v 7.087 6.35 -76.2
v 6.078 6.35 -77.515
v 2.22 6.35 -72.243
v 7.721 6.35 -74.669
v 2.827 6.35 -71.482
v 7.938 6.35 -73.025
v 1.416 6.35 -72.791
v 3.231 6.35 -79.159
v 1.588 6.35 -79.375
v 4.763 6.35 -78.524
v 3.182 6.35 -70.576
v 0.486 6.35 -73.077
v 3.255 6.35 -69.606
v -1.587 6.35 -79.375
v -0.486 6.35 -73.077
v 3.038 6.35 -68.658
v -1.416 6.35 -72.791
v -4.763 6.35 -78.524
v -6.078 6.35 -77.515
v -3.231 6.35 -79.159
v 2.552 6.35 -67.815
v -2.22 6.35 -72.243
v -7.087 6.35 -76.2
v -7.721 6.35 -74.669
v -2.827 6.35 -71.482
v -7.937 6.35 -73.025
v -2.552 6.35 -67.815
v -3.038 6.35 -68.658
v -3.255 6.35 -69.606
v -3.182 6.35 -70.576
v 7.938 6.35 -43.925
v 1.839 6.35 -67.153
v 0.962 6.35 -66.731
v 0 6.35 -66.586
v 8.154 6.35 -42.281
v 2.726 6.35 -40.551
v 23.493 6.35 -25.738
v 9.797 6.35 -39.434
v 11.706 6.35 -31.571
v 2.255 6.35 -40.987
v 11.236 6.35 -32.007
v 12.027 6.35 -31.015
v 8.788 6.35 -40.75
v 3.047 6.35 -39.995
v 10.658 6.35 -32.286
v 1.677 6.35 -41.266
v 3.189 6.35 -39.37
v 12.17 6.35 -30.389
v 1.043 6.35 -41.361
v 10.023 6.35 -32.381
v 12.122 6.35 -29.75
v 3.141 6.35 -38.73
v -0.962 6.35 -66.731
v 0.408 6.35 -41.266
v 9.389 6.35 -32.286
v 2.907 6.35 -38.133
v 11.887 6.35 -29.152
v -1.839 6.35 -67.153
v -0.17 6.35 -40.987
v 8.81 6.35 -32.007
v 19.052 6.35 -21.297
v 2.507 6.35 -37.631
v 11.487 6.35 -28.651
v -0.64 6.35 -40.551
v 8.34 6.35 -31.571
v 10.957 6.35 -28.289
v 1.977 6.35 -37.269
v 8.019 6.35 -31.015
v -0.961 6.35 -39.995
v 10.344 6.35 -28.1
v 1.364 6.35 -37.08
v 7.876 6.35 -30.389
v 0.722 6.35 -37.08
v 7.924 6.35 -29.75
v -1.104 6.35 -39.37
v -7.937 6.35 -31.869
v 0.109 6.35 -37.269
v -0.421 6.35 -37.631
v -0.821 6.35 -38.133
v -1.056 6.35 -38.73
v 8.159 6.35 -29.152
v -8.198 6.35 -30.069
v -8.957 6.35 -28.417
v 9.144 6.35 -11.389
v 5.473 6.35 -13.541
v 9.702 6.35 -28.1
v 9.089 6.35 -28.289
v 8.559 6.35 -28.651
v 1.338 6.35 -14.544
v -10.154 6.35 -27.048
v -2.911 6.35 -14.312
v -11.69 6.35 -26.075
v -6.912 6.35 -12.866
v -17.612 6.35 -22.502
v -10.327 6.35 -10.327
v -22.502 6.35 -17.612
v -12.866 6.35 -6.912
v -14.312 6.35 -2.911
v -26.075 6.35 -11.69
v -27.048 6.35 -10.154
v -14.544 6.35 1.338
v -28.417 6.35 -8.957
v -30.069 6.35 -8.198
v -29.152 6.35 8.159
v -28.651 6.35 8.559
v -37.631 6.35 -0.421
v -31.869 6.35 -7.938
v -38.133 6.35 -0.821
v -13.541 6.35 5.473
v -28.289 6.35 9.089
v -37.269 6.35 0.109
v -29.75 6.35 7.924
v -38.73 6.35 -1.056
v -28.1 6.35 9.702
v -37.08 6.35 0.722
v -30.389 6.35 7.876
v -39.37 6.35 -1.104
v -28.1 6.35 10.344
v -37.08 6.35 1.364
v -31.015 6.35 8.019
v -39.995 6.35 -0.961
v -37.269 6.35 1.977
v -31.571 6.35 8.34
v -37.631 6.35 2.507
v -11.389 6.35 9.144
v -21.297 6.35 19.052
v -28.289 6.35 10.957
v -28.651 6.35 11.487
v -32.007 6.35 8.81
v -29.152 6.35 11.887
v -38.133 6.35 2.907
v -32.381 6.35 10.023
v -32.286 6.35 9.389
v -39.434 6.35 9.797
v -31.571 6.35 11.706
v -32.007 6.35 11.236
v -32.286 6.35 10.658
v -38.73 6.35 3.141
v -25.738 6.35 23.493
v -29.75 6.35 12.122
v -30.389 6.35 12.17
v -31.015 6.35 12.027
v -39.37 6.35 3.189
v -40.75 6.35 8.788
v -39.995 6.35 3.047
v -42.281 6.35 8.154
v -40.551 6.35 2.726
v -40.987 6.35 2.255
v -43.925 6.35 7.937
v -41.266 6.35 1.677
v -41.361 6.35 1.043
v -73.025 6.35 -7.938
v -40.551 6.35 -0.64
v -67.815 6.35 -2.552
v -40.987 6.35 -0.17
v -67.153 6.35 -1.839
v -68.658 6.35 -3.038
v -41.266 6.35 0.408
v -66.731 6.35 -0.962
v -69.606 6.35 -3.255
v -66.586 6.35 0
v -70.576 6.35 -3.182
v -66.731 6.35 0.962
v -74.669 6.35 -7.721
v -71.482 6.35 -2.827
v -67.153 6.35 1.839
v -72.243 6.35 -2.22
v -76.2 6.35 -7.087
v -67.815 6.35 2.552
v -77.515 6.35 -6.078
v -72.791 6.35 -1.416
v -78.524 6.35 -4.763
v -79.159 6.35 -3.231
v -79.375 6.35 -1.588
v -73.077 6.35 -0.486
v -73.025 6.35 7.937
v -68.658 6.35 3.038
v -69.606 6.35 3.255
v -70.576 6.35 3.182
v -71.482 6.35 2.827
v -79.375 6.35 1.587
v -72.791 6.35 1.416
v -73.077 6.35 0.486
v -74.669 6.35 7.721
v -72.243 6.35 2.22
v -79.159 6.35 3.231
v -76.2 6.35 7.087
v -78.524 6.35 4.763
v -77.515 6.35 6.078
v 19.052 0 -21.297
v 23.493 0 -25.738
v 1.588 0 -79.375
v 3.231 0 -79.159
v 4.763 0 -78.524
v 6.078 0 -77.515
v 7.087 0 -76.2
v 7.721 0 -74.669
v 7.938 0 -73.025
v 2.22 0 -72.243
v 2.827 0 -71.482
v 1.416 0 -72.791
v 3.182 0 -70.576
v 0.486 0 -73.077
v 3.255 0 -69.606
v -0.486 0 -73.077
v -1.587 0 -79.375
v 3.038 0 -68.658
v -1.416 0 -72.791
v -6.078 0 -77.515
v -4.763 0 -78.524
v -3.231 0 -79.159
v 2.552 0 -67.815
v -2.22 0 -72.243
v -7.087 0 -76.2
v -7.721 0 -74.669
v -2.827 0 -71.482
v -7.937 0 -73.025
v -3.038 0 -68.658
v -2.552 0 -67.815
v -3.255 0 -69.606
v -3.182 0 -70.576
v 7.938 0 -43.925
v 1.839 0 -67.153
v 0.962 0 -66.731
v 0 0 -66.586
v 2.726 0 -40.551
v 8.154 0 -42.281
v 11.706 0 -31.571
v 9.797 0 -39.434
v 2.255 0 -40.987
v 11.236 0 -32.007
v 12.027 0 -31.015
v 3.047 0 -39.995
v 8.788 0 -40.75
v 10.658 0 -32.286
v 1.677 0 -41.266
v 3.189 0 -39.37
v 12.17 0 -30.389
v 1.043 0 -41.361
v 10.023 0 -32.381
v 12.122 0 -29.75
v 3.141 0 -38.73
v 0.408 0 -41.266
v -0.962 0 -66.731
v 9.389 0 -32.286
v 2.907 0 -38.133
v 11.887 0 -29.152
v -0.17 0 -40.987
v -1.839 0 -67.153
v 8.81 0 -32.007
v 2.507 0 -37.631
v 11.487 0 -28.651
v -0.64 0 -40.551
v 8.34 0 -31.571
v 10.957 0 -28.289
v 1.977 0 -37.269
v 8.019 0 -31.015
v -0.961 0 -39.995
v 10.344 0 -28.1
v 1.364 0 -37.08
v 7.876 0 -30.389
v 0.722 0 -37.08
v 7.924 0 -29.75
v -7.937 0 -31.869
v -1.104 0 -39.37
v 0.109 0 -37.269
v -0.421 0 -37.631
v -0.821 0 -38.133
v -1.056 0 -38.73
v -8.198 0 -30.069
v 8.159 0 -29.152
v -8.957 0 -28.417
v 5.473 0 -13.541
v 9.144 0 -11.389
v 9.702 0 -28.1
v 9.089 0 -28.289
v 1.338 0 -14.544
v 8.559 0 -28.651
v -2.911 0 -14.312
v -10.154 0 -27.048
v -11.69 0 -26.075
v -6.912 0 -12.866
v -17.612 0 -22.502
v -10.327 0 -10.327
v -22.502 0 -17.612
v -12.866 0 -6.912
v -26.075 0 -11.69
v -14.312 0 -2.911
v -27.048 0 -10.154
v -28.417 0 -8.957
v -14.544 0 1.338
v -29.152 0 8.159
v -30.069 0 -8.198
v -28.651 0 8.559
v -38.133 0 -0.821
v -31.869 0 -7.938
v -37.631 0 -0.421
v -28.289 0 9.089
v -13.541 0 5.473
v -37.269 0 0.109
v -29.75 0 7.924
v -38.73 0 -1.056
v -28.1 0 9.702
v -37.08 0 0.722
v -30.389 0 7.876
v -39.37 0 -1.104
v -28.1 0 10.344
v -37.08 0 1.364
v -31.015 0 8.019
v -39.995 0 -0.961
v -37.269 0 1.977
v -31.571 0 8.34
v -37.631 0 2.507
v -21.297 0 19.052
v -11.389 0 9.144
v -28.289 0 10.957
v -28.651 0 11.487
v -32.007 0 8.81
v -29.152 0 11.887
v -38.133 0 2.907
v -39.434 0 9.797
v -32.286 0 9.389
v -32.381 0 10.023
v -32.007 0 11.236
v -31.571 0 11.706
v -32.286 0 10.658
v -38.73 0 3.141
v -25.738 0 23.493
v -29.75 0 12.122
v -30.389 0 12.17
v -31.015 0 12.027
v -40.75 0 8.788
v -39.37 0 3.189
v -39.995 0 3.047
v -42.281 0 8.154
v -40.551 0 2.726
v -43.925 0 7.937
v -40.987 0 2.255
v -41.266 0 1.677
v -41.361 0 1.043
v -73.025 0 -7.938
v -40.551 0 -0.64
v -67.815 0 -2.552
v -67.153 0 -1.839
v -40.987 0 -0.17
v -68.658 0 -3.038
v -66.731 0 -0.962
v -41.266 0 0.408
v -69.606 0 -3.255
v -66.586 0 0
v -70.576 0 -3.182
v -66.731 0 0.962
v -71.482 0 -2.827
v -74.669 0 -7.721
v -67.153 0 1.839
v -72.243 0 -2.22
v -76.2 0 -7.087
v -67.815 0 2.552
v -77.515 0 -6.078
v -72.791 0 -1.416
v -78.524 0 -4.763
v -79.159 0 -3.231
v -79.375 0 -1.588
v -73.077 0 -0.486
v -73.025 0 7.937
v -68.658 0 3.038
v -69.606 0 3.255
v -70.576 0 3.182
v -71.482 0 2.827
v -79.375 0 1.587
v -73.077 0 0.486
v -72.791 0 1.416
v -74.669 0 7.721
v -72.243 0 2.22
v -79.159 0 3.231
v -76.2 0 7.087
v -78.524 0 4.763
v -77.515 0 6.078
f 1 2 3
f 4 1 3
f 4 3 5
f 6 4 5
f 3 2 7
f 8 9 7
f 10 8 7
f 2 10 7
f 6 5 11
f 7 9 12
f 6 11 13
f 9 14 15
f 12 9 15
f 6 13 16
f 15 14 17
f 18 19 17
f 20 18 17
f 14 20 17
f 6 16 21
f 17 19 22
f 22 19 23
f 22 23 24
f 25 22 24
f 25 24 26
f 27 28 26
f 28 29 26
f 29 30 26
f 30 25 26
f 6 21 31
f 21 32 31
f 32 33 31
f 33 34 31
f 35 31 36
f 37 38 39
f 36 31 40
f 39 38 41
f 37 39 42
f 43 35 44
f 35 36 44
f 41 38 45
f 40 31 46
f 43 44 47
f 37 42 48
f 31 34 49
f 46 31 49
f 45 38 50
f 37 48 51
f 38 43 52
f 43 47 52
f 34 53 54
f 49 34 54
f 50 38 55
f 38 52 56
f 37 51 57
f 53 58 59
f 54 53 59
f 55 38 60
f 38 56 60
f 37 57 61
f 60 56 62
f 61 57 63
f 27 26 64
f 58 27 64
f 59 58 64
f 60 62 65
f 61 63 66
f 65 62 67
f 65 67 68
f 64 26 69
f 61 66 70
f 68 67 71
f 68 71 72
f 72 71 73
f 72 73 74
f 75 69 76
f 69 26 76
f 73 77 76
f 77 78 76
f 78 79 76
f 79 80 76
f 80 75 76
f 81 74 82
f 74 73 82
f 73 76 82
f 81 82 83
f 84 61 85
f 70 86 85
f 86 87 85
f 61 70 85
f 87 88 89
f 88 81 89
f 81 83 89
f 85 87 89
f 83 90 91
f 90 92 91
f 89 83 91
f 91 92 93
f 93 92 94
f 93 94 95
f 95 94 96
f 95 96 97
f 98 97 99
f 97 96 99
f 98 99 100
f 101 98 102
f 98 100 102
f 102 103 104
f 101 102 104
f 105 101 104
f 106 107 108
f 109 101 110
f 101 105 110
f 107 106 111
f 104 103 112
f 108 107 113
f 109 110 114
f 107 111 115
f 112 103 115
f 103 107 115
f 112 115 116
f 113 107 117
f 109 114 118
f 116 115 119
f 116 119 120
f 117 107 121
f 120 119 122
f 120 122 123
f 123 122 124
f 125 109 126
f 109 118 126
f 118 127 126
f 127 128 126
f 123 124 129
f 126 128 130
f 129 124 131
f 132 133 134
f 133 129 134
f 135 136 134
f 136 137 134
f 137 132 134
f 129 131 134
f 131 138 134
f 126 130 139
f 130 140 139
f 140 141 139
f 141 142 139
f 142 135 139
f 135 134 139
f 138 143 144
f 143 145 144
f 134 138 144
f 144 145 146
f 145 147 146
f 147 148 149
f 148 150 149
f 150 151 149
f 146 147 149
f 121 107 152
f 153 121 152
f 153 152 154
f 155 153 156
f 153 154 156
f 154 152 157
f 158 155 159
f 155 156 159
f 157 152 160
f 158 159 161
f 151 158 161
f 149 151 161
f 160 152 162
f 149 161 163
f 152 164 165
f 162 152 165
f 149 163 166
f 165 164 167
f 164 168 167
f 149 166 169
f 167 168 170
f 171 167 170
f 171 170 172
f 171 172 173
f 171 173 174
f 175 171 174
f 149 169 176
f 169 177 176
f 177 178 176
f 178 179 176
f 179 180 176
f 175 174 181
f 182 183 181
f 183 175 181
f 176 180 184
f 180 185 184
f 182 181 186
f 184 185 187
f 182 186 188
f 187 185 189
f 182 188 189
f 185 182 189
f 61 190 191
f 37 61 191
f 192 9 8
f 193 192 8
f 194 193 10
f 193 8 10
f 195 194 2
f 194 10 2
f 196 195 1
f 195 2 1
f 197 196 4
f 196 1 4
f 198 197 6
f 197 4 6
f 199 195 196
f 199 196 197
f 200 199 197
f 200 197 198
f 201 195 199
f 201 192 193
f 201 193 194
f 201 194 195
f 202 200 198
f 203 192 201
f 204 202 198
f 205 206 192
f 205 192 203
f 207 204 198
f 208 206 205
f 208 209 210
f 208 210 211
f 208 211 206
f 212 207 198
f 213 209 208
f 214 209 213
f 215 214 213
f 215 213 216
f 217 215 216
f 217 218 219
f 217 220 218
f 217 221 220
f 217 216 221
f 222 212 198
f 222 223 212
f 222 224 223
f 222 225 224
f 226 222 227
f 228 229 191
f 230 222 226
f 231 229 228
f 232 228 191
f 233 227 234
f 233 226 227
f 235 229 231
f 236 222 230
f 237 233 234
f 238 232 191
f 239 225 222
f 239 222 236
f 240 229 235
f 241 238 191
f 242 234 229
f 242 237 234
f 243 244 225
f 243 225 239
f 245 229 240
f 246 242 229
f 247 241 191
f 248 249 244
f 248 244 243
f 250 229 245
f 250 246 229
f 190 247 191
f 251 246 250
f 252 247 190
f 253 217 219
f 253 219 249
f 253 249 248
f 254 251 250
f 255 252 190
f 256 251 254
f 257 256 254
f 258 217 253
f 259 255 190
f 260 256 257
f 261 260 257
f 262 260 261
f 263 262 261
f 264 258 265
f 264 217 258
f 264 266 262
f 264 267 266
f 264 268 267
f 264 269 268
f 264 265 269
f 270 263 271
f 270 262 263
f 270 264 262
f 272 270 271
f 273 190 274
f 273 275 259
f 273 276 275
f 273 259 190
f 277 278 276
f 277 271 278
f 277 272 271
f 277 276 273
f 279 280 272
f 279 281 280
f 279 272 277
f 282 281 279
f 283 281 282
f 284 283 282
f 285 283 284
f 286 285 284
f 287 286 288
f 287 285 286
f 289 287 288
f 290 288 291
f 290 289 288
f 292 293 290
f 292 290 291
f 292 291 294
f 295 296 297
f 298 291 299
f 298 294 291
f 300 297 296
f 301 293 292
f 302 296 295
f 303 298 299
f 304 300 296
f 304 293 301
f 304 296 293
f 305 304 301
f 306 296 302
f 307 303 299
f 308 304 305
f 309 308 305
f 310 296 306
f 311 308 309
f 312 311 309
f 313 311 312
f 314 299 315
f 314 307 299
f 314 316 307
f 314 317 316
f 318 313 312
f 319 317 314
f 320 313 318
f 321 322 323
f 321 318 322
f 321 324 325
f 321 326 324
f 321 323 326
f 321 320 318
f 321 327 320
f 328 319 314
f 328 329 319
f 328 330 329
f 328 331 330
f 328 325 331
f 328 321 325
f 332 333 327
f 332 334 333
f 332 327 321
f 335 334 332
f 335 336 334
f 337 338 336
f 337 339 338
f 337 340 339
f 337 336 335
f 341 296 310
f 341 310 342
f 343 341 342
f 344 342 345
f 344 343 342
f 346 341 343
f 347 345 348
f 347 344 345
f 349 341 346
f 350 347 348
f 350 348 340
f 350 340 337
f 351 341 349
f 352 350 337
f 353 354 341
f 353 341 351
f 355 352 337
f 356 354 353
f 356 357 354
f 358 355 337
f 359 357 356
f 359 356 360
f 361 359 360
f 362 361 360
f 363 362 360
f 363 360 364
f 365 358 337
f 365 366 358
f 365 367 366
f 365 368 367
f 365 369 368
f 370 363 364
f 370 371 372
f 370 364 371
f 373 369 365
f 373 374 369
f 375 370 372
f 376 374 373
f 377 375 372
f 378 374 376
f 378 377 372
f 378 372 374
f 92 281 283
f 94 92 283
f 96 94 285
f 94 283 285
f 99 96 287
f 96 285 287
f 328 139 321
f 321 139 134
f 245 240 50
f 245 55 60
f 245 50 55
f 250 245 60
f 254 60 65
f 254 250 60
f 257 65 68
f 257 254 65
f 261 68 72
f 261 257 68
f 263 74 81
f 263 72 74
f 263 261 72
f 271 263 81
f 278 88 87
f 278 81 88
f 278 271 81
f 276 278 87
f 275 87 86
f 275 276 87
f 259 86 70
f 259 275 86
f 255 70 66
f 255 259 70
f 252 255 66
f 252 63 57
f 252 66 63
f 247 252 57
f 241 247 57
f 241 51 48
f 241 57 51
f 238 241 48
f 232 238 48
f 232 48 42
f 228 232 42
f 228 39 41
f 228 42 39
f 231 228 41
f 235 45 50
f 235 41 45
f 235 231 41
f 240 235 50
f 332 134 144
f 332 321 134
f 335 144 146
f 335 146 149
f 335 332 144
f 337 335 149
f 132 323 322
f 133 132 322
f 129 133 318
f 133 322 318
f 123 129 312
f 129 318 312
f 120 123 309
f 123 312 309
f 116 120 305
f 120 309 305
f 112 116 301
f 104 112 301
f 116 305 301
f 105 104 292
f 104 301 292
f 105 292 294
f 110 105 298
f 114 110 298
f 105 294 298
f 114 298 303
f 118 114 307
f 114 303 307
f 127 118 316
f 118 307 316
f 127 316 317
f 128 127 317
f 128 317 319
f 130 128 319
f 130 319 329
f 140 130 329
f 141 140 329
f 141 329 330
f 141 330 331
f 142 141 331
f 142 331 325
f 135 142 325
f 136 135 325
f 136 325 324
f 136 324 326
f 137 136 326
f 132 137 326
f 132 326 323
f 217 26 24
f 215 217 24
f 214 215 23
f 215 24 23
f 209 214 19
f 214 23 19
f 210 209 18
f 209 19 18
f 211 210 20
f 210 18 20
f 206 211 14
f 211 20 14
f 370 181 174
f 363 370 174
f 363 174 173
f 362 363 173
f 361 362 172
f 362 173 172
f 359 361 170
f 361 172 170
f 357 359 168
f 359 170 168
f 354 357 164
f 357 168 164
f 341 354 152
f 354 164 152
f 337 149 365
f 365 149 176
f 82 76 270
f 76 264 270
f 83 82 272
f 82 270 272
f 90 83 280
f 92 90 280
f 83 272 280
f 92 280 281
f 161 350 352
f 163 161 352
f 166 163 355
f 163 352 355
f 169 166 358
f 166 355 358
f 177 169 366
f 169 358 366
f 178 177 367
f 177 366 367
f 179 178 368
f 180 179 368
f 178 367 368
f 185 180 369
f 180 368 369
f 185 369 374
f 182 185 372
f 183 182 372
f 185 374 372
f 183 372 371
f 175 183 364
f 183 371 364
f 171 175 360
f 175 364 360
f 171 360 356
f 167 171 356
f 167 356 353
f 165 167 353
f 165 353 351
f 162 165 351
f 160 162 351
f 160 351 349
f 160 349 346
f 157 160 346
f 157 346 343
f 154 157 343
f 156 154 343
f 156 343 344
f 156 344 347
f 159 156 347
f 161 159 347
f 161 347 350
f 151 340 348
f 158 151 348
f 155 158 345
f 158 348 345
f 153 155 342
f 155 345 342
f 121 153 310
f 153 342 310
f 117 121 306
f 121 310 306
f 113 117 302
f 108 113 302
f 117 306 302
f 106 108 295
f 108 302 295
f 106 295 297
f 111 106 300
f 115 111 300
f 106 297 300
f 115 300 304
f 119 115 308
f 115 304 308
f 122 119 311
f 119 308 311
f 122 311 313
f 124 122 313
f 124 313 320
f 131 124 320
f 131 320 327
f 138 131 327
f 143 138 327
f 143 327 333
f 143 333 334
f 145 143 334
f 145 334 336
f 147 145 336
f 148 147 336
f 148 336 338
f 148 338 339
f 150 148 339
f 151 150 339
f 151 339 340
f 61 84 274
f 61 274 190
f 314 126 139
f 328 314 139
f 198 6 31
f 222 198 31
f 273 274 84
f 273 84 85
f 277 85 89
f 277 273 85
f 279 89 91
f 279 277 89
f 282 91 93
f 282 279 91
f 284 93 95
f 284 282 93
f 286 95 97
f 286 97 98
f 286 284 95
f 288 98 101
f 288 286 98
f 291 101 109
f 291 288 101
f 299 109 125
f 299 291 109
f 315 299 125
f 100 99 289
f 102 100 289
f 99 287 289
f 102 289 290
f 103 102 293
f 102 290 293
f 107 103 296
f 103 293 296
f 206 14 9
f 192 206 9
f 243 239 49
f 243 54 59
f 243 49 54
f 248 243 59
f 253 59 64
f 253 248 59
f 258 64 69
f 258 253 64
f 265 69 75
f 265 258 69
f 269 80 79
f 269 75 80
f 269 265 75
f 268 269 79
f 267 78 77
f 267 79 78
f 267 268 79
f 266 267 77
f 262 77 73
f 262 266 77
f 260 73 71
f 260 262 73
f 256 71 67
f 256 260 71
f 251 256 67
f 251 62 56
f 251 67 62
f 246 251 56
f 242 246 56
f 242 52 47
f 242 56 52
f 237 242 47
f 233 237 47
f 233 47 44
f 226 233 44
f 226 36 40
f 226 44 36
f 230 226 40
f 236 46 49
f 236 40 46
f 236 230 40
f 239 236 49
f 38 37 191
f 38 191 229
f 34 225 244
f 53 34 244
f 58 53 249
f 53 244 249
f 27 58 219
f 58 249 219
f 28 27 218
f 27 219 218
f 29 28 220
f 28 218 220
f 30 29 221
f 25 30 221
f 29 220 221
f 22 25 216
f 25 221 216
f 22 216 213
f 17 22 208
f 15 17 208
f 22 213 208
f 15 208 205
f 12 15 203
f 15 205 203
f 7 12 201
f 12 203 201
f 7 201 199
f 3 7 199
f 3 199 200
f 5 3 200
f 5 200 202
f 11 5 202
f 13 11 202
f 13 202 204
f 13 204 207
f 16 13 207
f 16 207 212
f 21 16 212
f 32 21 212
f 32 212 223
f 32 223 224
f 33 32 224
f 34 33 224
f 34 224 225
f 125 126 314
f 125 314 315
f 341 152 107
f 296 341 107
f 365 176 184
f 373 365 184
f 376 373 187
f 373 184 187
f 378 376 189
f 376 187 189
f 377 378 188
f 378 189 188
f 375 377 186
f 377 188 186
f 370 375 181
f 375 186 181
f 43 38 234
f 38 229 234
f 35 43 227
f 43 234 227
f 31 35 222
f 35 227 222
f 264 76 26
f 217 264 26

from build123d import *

# Parameters (mm, degrees)
SKETCH1_R                    = 28.575
SKETCH1_R_2                  = 14.605
BOSS_EXTRUDE1_DEPTH          = 6.35
BOSS_EXTRUDE2_DEPTH          = 6.35
F_0_257_DIAMETER_HOLE1_D     = 6.5278
CIRPATTERN1_COUNT            = 4
CUT_EXTRUDE1_DEPTH           = 113.432663181
FILLET1_R                    = 6.35
BOSS_EXTRUDE3_DEPTH          = 6.35
F_18_0_1695_DIAMETER_HOLE1_D = 4.3053
FILLET2_R                    = 6.35


with BuildPart() as part:
    # Sketch1 → Boss-Extrude1 (new body)
    with BuildSketch(Plane(origin=(0, 0, 0), x_dir=(1, 0, 0), z_dir=(0, 1, 0))):
        with Locations(Location((0, 0, 0), (0, 0, 270))):
            Circle(SKETCH1_R)
        with Locations(Location((0, 0, 0), (0, 0, 270))):
            Circle(SKETCH1_R_2, mode=Mode.SUBTRACT)
    extrude(amount=BOSS_EXTRUDE1_DEPTH)

    # Sketch2 → Boss-Extrude2 (add)
    with BuildSketch(Plane(origin=(0, 6.35, 0), x_dir=(1, 0, 0), z_dir=(0, 1, 0))):
        with BuildLine():
            Line((73.025, -7.9375), (25.4, -7.9375))
            Line((25.4, -7.9375), (25.4, 7.9375))
            Line((25.4, 7.9375), (73.025, 7.9375))
            ThreePointArc((73.025, 7.9375), (77.515128061, 6.077628061), (79.375, 1.5875))
            Line((79.375, 1.5875), (79.375, -1.5875))
            ThreePointArc((79.375, -1.5875), (77.515128061, -6.077628061), (73.025, -7.9375))
        make_face()
    boss_extrude2 = extrude(amount=-BOSS_EXTRUDE2_DEPTH)

    # F (0.257) Diameter Hole1 (through all)
    with Locations(Plane(origin=(0, 6.35, 0), x_dir=(1, 0, 0), z_dir=(0, 1, 0))):
        with Locations((69.85, 0)):
            f_0_257_diameter_hole1 = Hole(F_0_257_DIAMETER_HOLE1_D / 2)

    # CirPattern1: Boss-Extrude2, F (0.257) Diameter Hole1 ×4 about axis
    cirpattern1_axis = Axis((0, 0, 0), (0, 1, 0))
    add([boss_extrude2.rotate(cirpattern1_axis, i * 360 / CIRPATTERN1_COUNT) for i in range(1, CIRPATTERN1_COUNT)])
    add([f_0_257_diameter_hole1.rotate(cirpattern1_axis, i * 360 / CIRPATTERN1_COUNT) for i in range(1, CIRPATTERN1_COUNT)], mode=Mode.SUBTRACT)

    # Sketch5 → Cut-Extrude1 (cut, through all)
    with BuildSketch(Plane(origin=(0, 6.35, 0), x_dir=(1, 0, 0), z_dir=(0, 1, 0))):
        Polygon((-38.294182992, -36.049118961), (36.049118961, 38.294182992), (38.294182992, 36.049118961), (-36.049118961, -38.294182992), align=None)
    extrude(amount=-CUT_EXTRUDE1_DEPTH, mode=Mode.SUBTRACT)


with BuildPart() as body_2:
    # of the pieces the cut leaves, the one that is kept (cut_extrude1_keep)
    add(part.part.solids().sort_by_distance((19.051838715, 0, -21.296902746))[0])

    # Fillet1
    fillet1_edges = [body_2.edges().sort_by_distance(p)[0] for p in [
        (-7.9375, 3.175, -27.450441139),
        (-27.450441139, 3.175, -7.9375),
    ]]
    fillet(fillet1_edges, radius=FILLET1_R)

    # Sketch7 → Boss-Extrude3 (add)
    with BuildSketch(Plane(origin=(0, 6.35, 0), x_dir=(1, 0, 0), z_dir=(0, 1, 0))):
        Polygon((-14.513140303, -12.268076272), (-25.738460454, -23.493396424), (-45.944036726, -3.287820151), (-34.718716575, 7.9375), align=None)
    boss_extrude3 = extrude(amount=-BOSS_EXTRUDE3_DEPTH)

    # #18 (0.1695) Diameter Hole1 (through all)
    with Locations(Plane(origin=(0, 6.35, 0), x_dir=(1, 0, 0), z_dir=(0, 1, 0))):
        with Locations((-30.228588515, -10.023012242), (-39.208844636, -1.042756121)):
            f_18_0_1695_diameter_hole1 = Hole(F_18_0_1695_DIAMETER_HOLE1_D / 2)

    # Mirror1: Boss-Extrude3, #18 (0.1695) Diameter Hole1 across plane
    add(boss_extrude3.mirror(Plane(origin=(0, 0, 0), x_dir=(0.7071067811865478, 0, 0.7071067811865472), z_dir=(0.7071067811865475, 0, -0.7071067811865477))))
    add(f_18_0_1695_diameter_hole1.mirror(Plane(origin=(0, 0, 0), x_dir=(0.7071067811865478, 0, 0.7071067811865472), z_dir=(0.7071067811865475, 0, -0.7071067811865477))), mode=Mode.SUBTRACT)

    # Fillet2
    fillet2_edges = [body_2.edges().sort_by_distance(p)[0] for p in [
        (-41.294356878, 3.175, 7.9375),
        (7.9375, 3.175, -41.294356878),
    ]]
    fillet(fillet2_edges, radius=FILLET2_R)


solid = body_2.part
